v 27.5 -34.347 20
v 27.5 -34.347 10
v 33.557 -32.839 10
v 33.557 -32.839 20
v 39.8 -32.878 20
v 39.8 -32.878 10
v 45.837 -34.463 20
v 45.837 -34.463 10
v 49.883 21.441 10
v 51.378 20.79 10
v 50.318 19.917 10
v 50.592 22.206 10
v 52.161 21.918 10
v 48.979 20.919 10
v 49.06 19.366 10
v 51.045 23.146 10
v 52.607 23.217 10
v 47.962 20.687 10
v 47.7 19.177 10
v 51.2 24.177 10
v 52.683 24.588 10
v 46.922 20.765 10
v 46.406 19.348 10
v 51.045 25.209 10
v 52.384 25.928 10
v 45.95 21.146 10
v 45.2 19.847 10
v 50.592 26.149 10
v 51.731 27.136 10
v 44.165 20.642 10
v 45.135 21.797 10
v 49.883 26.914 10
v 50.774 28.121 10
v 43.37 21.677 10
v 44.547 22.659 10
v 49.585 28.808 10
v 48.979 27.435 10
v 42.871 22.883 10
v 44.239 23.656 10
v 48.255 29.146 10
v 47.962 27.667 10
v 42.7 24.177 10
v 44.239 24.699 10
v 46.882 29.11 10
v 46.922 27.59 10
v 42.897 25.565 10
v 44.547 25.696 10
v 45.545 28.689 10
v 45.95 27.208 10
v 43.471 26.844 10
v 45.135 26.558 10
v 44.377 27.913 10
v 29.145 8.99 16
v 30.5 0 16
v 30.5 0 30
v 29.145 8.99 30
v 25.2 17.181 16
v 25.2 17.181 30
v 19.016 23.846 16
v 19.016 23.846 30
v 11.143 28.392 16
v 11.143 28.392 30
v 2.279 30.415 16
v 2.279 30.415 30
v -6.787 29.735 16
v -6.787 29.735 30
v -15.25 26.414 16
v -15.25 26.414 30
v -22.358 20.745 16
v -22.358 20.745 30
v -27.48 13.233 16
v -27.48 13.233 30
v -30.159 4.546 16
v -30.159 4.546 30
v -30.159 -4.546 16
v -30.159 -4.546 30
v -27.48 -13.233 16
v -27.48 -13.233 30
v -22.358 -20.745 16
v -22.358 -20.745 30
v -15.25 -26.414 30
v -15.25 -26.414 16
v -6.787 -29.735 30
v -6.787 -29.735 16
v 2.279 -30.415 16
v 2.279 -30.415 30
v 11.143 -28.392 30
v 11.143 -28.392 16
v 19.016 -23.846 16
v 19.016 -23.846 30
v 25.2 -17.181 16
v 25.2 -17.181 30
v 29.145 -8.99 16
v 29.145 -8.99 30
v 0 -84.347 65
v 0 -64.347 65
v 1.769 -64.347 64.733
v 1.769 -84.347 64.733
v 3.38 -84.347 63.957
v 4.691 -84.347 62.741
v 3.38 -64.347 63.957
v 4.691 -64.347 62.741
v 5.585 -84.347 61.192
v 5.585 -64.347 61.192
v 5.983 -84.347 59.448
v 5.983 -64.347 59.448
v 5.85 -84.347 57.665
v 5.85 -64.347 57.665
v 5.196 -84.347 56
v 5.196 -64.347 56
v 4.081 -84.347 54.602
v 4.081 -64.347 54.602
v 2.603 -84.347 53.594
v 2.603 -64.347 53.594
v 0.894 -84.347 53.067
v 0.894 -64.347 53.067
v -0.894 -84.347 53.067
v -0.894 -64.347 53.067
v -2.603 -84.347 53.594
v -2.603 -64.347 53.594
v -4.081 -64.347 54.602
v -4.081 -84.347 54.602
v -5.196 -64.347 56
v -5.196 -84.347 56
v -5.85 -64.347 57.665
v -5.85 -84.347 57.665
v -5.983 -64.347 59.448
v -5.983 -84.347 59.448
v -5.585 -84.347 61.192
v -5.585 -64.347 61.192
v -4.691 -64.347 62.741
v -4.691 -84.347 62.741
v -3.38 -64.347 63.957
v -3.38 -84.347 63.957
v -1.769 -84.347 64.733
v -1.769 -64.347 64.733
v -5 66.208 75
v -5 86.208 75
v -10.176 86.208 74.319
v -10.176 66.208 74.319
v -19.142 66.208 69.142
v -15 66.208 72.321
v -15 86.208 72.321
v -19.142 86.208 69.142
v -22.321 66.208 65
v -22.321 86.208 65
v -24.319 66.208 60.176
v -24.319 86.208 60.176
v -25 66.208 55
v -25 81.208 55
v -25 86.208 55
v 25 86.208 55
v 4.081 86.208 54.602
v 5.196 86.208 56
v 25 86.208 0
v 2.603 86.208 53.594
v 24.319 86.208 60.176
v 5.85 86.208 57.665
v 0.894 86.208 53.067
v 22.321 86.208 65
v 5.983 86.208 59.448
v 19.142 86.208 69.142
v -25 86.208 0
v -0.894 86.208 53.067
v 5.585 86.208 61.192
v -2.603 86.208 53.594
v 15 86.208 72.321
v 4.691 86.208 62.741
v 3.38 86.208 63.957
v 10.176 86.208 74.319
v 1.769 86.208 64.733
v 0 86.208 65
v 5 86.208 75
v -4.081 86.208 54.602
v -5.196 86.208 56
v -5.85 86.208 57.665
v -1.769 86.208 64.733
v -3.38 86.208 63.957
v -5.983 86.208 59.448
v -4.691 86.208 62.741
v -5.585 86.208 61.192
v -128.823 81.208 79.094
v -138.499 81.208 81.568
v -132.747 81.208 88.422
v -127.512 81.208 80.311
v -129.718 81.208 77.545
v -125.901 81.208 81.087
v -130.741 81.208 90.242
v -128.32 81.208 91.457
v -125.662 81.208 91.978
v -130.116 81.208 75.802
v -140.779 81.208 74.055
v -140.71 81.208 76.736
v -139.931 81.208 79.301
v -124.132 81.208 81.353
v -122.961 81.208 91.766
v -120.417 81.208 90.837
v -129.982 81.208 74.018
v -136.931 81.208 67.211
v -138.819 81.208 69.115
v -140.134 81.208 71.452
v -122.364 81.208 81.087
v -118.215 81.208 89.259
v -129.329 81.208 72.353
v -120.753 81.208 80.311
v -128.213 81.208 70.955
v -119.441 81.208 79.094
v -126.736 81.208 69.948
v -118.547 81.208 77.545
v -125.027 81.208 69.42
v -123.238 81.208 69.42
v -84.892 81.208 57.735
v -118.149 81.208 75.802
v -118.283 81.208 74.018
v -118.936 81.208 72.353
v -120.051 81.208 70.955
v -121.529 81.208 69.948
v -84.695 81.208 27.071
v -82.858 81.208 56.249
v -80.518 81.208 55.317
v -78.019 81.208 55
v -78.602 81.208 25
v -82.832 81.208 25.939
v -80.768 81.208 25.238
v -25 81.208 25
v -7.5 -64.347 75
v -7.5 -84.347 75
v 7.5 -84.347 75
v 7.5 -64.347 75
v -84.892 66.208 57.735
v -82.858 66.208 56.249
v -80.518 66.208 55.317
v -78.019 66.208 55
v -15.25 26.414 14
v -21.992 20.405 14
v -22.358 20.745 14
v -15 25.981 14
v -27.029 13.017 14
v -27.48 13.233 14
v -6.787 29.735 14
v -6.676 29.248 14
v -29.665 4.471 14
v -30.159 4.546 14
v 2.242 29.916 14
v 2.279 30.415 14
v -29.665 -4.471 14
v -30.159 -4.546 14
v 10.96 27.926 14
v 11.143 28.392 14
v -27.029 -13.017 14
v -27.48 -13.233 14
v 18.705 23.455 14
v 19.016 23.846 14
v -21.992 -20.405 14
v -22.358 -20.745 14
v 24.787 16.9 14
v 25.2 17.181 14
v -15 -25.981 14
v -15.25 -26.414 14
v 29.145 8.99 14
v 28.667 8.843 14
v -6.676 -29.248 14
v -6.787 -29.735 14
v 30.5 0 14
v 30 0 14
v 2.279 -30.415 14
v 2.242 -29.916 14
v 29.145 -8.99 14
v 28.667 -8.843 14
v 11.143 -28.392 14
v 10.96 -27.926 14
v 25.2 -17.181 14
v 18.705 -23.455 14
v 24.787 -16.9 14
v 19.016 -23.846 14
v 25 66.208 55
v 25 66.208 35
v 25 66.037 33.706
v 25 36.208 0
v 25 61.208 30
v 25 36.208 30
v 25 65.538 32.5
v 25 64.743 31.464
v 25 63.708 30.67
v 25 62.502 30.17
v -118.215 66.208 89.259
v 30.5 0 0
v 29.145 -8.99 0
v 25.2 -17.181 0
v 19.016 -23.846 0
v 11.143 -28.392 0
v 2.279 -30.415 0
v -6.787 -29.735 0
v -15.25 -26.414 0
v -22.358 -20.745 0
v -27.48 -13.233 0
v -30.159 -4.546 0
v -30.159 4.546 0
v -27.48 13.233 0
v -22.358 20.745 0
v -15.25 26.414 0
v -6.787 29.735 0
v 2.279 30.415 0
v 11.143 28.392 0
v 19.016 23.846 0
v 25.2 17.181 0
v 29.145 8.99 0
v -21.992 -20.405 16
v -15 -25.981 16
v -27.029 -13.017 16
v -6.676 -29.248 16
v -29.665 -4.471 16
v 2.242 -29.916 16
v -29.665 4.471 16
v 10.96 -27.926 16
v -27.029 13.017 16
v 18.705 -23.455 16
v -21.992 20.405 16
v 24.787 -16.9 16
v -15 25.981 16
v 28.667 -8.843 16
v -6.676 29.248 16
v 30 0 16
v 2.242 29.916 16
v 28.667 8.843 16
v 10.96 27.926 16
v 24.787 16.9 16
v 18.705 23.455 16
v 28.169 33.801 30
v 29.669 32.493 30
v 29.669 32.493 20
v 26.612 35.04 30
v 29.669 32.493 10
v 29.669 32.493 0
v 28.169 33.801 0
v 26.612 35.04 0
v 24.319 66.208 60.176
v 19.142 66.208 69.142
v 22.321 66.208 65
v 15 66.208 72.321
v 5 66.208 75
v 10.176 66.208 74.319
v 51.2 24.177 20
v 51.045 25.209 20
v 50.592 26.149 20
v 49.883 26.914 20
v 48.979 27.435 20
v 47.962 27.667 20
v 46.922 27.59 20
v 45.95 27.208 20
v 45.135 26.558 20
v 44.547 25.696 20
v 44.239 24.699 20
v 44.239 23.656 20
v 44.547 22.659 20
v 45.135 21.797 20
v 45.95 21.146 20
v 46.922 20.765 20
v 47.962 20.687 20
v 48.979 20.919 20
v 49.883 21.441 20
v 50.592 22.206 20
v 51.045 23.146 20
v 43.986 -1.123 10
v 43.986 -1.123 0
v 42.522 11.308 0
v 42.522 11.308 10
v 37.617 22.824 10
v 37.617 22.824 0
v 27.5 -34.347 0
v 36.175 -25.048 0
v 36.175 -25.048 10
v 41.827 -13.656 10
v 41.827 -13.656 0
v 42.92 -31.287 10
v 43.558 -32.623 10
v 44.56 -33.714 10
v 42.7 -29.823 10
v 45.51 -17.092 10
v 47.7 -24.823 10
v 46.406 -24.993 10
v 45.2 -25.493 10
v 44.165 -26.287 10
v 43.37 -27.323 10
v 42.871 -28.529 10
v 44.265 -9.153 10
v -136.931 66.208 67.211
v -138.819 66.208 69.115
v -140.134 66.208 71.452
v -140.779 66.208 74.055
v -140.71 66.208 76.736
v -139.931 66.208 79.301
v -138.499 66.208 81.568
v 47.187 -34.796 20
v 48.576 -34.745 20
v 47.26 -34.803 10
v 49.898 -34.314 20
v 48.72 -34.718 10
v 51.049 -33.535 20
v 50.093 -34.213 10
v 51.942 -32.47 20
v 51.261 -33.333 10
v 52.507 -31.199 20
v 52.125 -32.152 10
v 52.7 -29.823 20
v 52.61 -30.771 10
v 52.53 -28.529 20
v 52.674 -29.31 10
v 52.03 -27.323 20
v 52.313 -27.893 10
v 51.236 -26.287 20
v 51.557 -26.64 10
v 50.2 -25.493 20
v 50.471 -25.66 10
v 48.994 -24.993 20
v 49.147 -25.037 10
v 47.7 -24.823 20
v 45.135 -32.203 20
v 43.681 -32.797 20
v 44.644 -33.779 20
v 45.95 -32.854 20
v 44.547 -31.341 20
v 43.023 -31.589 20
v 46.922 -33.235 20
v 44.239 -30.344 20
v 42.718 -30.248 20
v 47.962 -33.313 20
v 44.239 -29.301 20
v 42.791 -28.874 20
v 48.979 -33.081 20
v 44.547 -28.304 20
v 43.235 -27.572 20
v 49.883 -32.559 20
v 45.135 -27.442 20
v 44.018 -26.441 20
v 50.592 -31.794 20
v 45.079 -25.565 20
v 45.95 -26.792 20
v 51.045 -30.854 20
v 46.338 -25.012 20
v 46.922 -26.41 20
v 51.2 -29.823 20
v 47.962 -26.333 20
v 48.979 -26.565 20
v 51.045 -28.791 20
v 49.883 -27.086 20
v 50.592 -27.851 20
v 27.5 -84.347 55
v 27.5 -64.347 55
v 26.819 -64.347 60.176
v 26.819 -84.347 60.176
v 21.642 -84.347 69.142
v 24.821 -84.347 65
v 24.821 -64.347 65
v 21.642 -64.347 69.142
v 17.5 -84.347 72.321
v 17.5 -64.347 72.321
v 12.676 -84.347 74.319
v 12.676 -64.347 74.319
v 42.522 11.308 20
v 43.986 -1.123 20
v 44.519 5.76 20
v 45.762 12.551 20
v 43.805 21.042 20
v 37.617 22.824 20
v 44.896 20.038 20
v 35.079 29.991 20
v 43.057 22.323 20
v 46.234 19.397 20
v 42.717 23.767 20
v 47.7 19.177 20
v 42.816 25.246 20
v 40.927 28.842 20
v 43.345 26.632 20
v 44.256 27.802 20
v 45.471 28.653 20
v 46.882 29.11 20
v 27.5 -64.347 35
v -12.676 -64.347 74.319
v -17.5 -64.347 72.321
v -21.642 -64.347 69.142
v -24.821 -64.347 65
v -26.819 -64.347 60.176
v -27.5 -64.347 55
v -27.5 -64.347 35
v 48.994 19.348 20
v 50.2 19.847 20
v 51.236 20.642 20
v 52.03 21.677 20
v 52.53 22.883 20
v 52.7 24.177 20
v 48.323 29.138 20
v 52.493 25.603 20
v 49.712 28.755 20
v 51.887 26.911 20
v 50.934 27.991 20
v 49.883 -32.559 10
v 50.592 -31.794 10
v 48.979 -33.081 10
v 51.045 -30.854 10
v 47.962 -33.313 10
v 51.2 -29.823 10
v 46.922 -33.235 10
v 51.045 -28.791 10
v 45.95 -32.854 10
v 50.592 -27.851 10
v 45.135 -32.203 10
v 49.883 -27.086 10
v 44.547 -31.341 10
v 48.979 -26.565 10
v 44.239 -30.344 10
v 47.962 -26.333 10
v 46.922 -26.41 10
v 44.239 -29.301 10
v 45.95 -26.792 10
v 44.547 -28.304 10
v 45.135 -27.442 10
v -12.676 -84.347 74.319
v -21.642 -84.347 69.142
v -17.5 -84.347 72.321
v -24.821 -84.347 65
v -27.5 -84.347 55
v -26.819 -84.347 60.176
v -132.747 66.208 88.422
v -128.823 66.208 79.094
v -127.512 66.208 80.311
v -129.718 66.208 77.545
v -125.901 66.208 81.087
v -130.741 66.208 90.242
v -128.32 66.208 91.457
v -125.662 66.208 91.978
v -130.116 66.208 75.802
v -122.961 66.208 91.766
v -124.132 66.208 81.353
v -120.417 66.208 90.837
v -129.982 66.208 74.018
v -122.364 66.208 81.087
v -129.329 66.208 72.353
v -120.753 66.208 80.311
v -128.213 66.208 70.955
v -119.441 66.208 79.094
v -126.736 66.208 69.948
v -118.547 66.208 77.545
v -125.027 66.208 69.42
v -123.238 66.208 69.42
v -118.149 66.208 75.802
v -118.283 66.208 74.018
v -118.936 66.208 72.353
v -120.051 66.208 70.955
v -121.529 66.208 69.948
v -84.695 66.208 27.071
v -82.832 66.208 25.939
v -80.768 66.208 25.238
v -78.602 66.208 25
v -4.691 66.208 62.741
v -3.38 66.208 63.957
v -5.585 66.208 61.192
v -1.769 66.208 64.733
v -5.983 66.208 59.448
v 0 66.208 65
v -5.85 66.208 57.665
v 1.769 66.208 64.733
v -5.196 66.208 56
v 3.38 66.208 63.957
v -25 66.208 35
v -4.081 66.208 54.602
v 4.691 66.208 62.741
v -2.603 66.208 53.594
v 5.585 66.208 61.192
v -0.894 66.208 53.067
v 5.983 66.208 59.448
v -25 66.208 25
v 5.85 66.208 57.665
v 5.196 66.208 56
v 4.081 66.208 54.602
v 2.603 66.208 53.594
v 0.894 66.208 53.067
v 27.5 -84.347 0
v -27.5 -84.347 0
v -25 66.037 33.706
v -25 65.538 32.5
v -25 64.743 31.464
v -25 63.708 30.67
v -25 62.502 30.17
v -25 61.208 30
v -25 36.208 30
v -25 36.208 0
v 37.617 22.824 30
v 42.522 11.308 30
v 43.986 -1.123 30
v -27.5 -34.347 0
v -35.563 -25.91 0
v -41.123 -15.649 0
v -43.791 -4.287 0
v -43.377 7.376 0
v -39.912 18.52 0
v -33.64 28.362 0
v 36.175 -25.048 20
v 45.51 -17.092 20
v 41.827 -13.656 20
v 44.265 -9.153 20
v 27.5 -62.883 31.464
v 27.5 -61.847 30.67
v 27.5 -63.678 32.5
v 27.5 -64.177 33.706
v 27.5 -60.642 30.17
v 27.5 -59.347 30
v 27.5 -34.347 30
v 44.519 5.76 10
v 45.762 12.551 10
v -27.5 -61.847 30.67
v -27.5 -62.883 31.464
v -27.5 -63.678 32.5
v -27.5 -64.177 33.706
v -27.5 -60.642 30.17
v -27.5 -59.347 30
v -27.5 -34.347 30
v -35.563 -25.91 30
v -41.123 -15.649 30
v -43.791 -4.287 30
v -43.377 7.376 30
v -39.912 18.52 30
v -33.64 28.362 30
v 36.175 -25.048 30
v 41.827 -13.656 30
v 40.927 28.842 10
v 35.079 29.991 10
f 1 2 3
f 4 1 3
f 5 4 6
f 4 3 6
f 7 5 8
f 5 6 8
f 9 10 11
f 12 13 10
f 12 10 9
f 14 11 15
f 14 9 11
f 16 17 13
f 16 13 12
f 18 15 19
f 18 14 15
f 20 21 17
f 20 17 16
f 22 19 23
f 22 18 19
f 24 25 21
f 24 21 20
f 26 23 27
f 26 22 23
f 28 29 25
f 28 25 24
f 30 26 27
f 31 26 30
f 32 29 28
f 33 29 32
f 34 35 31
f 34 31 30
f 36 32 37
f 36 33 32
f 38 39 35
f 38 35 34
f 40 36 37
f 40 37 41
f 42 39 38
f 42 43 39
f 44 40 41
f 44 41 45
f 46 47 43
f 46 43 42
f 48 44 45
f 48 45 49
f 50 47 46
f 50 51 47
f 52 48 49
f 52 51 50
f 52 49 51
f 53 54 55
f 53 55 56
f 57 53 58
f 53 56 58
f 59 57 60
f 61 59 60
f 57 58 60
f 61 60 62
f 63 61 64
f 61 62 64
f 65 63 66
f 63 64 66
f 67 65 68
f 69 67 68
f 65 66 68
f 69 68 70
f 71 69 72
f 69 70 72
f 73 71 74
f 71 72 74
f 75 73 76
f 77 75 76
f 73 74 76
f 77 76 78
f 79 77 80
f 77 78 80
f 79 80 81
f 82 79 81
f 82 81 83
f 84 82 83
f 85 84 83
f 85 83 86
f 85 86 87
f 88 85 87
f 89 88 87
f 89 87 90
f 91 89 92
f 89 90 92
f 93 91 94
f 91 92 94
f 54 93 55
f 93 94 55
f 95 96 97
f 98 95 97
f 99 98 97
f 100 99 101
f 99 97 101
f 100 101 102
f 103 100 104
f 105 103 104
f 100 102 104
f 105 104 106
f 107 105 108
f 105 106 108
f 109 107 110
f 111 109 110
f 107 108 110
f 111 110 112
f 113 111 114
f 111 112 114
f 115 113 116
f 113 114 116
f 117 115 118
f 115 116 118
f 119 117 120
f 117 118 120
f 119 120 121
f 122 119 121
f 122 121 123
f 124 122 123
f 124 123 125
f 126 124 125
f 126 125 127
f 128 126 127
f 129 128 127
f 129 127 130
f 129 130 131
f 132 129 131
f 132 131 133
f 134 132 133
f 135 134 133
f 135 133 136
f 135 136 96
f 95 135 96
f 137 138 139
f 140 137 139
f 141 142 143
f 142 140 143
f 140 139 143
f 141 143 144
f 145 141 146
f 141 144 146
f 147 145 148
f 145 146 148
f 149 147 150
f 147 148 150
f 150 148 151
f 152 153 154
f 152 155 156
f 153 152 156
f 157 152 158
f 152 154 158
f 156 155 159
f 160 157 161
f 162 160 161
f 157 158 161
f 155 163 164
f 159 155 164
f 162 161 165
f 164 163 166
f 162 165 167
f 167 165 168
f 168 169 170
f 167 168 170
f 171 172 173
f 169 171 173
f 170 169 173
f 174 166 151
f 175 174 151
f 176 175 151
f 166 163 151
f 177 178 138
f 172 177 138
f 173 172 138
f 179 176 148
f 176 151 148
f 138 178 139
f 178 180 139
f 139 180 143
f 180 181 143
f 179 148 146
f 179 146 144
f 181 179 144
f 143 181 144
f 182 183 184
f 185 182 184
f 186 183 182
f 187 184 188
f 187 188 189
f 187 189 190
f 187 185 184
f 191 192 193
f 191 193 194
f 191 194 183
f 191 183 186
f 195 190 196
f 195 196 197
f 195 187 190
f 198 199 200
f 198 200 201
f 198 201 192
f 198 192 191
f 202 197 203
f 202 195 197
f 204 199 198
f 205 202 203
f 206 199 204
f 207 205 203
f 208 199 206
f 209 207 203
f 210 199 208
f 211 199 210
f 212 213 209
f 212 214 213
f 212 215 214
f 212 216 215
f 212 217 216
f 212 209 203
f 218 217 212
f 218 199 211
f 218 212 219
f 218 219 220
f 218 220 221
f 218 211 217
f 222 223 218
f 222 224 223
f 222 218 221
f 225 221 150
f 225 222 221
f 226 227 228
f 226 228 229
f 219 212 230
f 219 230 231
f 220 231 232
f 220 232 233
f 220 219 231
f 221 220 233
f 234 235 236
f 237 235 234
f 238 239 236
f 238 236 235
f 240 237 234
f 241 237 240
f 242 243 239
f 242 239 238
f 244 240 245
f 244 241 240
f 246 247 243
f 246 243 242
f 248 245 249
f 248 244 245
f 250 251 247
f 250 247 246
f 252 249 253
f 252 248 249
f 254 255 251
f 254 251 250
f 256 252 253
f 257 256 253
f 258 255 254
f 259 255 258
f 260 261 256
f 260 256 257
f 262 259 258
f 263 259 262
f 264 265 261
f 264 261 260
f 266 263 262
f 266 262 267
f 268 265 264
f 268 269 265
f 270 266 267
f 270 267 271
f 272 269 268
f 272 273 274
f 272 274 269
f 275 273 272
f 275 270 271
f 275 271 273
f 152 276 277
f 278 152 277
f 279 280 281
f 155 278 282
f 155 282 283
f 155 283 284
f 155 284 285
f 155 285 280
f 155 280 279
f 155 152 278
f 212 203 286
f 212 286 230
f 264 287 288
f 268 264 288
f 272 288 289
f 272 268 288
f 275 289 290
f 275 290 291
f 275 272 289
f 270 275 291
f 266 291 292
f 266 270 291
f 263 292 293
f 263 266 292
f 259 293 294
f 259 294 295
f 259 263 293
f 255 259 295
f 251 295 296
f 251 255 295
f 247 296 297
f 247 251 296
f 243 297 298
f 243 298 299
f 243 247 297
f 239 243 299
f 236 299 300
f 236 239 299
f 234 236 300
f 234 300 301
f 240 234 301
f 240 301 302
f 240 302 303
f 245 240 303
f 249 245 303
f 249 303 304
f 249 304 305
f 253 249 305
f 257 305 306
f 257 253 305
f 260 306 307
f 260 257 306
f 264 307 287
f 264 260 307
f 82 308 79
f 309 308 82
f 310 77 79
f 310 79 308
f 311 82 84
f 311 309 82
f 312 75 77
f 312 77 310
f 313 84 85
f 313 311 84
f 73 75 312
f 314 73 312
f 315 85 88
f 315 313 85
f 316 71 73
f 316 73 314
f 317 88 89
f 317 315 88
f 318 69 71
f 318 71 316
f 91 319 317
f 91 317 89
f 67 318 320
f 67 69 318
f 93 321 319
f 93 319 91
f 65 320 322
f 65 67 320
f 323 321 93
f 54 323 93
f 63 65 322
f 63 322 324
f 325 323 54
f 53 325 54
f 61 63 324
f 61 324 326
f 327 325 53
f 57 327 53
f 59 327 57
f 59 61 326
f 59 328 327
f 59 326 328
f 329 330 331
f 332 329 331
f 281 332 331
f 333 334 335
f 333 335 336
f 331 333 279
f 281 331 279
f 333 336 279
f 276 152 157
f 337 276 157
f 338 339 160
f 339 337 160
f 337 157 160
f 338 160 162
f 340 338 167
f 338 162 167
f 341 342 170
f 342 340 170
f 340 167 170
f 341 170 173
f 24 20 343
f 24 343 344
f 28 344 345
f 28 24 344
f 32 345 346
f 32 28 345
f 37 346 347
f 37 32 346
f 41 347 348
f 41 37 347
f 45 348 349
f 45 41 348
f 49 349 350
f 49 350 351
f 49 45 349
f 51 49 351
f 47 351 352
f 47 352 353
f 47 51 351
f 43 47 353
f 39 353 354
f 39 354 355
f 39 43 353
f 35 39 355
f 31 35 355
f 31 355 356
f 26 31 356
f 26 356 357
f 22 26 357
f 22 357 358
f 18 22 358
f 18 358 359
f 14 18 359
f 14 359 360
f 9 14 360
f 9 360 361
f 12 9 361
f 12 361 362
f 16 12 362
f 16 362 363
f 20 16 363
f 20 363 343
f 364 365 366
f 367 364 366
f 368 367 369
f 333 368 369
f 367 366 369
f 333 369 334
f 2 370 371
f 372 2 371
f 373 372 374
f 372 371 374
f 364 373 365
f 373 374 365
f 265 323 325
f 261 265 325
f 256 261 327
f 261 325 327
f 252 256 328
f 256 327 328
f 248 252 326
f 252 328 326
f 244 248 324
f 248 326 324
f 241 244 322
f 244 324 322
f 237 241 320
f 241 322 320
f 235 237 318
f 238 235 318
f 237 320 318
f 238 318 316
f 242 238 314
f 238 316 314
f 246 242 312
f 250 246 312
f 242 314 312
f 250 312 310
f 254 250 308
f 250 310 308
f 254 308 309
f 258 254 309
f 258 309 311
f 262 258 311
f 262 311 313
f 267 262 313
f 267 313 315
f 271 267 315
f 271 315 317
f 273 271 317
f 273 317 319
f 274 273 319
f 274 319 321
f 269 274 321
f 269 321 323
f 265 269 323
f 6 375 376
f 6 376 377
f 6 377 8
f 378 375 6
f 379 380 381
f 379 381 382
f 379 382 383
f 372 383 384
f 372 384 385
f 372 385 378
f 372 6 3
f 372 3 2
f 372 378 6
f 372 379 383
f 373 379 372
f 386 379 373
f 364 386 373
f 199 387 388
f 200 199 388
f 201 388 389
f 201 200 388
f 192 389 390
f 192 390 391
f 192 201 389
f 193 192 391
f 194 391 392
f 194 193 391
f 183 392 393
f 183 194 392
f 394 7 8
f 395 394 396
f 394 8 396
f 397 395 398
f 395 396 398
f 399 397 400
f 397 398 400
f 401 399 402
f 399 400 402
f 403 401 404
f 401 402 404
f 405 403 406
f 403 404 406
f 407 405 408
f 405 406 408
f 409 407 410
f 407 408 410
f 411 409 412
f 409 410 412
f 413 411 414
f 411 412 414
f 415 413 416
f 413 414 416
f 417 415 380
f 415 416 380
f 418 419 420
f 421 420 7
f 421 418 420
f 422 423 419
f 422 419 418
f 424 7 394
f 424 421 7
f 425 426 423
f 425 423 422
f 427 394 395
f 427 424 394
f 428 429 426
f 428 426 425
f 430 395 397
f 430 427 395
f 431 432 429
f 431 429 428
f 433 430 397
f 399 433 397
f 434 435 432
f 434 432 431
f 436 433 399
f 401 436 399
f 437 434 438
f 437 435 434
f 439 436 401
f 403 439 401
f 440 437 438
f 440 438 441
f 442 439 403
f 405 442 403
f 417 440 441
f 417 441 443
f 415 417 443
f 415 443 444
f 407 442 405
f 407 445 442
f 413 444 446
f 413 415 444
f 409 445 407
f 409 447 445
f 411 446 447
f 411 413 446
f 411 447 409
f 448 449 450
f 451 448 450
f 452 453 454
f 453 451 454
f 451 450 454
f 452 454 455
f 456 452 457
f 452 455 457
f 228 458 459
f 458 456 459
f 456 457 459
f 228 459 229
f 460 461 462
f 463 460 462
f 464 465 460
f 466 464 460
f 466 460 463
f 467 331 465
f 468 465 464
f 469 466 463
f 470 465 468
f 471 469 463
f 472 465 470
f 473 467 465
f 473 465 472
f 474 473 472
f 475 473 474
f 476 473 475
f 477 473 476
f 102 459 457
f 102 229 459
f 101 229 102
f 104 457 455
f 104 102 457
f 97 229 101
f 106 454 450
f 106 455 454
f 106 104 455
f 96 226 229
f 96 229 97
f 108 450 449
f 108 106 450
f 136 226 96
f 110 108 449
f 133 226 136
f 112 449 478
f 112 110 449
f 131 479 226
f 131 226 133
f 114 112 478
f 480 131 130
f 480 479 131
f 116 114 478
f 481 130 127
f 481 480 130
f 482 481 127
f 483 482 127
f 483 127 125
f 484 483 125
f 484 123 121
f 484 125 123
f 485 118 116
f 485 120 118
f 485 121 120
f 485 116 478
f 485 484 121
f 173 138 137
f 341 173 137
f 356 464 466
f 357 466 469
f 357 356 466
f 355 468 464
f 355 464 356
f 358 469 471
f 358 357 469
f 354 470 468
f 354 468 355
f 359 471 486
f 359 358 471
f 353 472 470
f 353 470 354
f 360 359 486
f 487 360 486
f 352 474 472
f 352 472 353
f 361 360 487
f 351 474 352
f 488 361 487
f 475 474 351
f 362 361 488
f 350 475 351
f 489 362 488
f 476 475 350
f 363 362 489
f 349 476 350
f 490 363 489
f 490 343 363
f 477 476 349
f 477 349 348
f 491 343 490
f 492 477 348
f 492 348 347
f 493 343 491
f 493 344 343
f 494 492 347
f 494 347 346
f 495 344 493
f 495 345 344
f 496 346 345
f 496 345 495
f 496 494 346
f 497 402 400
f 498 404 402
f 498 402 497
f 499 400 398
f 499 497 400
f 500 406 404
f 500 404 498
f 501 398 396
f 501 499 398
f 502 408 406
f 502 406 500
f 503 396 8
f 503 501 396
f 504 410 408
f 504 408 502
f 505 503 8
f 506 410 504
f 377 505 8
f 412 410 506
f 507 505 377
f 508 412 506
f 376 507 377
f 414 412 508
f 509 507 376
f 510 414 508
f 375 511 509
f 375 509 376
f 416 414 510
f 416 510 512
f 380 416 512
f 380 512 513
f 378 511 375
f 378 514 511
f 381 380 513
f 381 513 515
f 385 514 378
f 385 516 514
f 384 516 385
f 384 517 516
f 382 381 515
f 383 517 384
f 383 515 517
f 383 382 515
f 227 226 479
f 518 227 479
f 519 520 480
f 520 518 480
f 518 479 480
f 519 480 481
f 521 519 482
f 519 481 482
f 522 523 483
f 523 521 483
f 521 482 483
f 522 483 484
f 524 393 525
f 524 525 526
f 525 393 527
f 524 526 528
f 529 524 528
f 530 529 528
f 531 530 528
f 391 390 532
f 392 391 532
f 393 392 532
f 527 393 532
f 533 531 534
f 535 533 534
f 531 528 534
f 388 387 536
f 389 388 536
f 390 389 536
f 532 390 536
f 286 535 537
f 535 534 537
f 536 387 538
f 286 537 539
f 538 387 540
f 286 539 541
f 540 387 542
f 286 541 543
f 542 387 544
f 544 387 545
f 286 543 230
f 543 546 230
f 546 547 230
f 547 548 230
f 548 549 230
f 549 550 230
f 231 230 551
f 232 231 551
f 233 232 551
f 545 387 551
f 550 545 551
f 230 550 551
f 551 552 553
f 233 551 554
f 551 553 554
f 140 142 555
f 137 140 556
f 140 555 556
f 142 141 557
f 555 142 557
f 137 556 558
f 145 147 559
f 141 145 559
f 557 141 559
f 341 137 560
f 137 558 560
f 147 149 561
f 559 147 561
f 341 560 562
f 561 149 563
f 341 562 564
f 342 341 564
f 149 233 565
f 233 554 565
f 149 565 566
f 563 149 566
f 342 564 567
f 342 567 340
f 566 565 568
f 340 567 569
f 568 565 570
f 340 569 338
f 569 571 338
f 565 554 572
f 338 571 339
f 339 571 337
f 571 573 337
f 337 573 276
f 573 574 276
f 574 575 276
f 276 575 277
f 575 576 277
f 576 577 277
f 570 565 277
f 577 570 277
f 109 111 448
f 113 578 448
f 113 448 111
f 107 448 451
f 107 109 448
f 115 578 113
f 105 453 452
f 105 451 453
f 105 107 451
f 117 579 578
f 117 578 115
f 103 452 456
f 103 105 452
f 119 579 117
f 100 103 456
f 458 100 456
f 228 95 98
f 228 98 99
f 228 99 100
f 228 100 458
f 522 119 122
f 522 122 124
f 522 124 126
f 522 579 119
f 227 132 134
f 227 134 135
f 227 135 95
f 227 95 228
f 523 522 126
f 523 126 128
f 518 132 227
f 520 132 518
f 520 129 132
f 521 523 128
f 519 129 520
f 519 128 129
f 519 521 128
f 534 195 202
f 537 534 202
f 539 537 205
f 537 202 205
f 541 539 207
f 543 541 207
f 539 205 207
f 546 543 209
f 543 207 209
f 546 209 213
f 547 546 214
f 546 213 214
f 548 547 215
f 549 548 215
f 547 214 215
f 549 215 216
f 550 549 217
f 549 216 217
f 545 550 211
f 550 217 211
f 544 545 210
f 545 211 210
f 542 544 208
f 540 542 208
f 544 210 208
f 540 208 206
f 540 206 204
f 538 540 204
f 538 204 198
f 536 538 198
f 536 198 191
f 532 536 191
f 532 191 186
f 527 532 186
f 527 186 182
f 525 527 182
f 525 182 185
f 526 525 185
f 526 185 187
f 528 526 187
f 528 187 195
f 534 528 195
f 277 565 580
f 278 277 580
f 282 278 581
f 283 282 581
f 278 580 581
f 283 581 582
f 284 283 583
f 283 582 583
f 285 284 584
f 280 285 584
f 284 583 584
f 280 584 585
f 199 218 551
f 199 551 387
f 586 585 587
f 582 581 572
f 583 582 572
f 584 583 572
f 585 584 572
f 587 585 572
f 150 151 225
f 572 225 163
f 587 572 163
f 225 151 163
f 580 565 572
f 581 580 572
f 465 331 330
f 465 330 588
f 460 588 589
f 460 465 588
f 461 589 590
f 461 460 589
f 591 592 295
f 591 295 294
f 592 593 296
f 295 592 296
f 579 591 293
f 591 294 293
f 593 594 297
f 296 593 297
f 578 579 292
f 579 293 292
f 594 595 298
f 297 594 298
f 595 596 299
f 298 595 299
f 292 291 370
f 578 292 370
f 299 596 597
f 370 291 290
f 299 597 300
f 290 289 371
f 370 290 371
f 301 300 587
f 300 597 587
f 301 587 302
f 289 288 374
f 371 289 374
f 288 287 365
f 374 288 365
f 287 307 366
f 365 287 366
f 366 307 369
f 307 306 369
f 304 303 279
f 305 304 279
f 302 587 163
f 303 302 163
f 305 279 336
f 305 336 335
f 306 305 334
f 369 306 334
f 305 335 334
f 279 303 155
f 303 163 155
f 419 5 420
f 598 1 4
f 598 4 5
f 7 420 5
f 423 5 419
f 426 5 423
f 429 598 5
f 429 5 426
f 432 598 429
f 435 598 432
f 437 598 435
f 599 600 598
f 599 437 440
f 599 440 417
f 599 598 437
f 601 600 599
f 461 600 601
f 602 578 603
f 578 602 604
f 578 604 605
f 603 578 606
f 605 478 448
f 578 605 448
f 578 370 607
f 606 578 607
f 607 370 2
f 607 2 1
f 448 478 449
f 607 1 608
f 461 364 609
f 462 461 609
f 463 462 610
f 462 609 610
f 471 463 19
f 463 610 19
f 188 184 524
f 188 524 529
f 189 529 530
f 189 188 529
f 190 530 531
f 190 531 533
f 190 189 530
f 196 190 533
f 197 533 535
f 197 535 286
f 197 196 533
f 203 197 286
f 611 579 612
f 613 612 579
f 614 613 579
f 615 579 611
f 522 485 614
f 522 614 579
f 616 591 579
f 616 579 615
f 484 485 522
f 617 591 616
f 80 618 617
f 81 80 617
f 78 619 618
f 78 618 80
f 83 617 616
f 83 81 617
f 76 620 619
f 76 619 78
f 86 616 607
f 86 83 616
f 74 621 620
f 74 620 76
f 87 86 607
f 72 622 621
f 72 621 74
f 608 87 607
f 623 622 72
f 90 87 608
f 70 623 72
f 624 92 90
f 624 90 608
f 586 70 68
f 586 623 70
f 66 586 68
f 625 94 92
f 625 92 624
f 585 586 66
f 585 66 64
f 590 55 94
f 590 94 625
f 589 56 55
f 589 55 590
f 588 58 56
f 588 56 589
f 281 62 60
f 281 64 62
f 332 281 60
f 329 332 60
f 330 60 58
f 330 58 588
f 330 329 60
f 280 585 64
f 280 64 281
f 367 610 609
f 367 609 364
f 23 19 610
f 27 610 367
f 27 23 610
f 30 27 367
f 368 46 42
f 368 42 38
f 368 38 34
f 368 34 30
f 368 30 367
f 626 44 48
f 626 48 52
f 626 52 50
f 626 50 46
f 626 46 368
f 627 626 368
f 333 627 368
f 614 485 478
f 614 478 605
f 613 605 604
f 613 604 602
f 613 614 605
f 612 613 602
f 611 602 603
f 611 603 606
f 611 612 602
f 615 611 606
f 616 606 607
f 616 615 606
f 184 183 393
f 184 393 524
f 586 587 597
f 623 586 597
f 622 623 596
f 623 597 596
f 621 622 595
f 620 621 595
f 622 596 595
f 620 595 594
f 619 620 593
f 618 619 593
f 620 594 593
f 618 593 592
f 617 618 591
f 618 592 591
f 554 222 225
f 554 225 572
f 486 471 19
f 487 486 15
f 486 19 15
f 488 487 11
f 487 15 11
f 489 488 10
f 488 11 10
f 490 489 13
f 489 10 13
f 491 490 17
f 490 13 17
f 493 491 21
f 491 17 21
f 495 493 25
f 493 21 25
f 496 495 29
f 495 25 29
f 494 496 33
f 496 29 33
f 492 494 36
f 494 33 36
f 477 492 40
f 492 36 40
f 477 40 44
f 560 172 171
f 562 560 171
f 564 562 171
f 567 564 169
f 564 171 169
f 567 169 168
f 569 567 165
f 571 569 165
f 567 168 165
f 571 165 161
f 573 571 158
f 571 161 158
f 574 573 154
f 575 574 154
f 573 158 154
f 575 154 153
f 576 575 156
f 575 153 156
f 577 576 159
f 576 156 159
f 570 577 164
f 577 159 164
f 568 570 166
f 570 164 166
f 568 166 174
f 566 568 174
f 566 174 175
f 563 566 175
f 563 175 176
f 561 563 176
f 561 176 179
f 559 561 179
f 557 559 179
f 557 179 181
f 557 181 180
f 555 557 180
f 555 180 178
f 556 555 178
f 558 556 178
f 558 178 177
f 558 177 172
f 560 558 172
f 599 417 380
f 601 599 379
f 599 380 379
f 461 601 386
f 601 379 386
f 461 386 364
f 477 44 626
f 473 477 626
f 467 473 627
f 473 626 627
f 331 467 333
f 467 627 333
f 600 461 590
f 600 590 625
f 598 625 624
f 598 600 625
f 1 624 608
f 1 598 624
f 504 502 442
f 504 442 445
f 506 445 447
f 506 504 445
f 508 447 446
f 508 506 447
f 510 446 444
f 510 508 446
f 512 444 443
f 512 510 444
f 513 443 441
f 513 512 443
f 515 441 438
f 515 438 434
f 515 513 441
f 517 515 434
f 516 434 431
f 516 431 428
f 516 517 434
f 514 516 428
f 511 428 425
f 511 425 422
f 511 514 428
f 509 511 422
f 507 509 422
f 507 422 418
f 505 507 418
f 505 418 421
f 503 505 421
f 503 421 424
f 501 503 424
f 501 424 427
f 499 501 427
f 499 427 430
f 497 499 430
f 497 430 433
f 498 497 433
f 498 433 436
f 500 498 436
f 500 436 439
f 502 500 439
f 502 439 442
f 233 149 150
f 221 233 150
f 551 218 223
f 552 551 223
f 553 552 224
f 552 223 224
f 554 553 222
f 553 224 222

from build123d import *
from build123d.topology import SkipClean

# Parameters (mm, degrees)
BOSS_EXTRUDE1_DEPTH = 30
BOSS_EXTRUDE2_DEPTH = 55
BOSS_EXTRUDE3_DEPTH = 50
SKETCH7_R           = 6
CUT_EXTRUDE4_DEPTH  = 174.861655244
SKETCH9_R           = 6
CUT_EXTRUDE6_DEPTH  = 50
BOSS_EXTRUDE4_DEPTH = 57
BOSS_EXTRUDE5_DEPTH = 15
CUT_EXTRUDE8_DEPTH  = 20
SKETCH14_R          = 6
CUT_EXTRUDE9_DEPTH  = 20
SKETCH29_R          = 30
CUT_EXTRUDE10_DEPTH = 177.381705753
SKETCH31_R          = 30.5
CUT_EXTRUDE11_DEPTH = 14
CUT_EXTRUDE12_START = -14
SKETCH32_R          = 30.5
CUT_EXTRUDE12_DEPTH = 14
BOSS_EXTRUDE6_START = -30
SKETCH33_R          = 5
SKETCH33_R_2        = 3.5
BOSS_EXTRUDE6_DEPTH = 30
CUT_EXTRUDE13_START = -10
SKETCH34_R          = 3.5
CUT_EXTRUDE13_DEPTH = 10
SKETCH35_R          = 3.5
CUT_EXTRUDE14_DEPTH = 10


with BuildPart() as part:
    # Sketch1 → Boss-Extrude1 (new body)
    with BuildSketch(Plane.XY):
        with BuildLine():
            Line((-25, 86.20773398), (-25, 36.20773398))
            ThreePointArc((-25, 36.20773398), (-43.972404666, 1.558084675), (-27.5, -34.347488991))
            Line((-27.5, -34.347488991), (-27.5, -84.347488991))
            Line((-27.5, -84.347488991), (27.5, -84.347488991))
            Line((27.5, -84.347488991), (27.5, -34.347488991))
            ThreePointArc((27.5, -34.347488991), (43.972404666, 1.558084675), (25, 36.20773398))
            Line((25, 36.20773398), (25, 86.20773398))
            Line((25, 86.20773398), (-25, 86.20773398))
        make_face()
    extrude(amount=BOSS_EXTRUDE1_DEPTH)

    # Sketch3 → Boss-Extrude2 (add)
    with BuildSketch(Plane.ZY.offset(27.5)):
        with BuildLine():
            Line((30, -59.347488991), (30, -84.347488991))
            Line((30, -84.347488991), (55, -84.347488991))
            Line((55, -84.347488991), (75, -84.347488991))
            Line((75, -84.347488991), (75, -79.347488991))
            Line((75, -79.347488991), (75, -69.347488991))
            Line((75, -69.347488991), (75, -64.347488991))
            Line((75, -64.347488991), (55, -64.347488991))
            Line((55, -64.347488991), (35, -64.347488991))
            ThreePointArc((35, -64.347488991), (31.464466094, -62.883022897), (30, -59.347488991))
        make_face()
    extrude(amount=-BOSS_EXTRUDE2_DEPTH)

    # Sketch5 → Boss-Extrude3 (add)
    with BuildSketch(Plane.ZY.offset(25)):
        with BuildLine():
            Line((30, 86.20773398), (55, 86.20773398))
            Line((55, 86.20773398), (75, 86.20773398))
            Line((75, 86.20773398), (75, 81.20773398))
            Line((75, 81.20773398), (75, 71.20773398))
            Line((75, 71.20773398), (75, 66.20773398))
            Line((75, 66.20773398), (70, 66.20773398))
            Line((70, 66.20773398), (35, 66.20773398))
            ThreePointArc((35, 66.20773398), (31.464466094, 64.743267886), (30, 61.20773398))
            Line((30, 61.20773398), (30, 36.20773398))
            Line((30, 36.20773398), (0, 36.20773398))
            Line((0, 36.20773398), (0, 86.20773398))
            Line((0, 86.20773398), (30, 86.20773398))
        make_face()
    extrude(amount=-BOSS_EXTRUDE3_DEPTH)

    # Sketch7 → Cut-Extrude4 (cut, through all)
    with BuildSketch(Plane(origin=(0, -64.347488991, 0), x_dir=(1, 0, 0), z_dir=(0, 1, 0))):
        with BuildLine():
            Line((-27.5, -75), (-7.5, -75))
            ThreePointArc((-7.5, -75), (-21.642135624, -69.142135624), (-27.5, -55))
            Line((-27.5, -55), (-27.5, -75))
        make_face()
        with BuildLine():
            ThreePointArc((27.5, -55), (21.642135624, -69.142135624), (7.5, -75))
            Line((7.5, -75), (27.5, -75))
            Line((27.5, -75), (27.5, -55))
        make_face()
        with Locations(Location((0, -59, 0), (0, 0, 270))):
            Circle(SKETCH7_R)
    extrude(amount=-CUT_EXTRUDE4_DEPTH, mode=Mode.SUBTRACT)

    # Sketch9 → Cut-Extrude6 (cut)
    with BuildSketch(Plane(origin=(0, 86.20773398, 0), x_dir=(1, 0, 0), z_dir=(0, 1, 0))):
        with Locations(Location((0, -59, 0), (0, 0, 270))):
            Circle(SKETCH9_R)
        with BuildLine():
            ThreePointArc((-5, -75), (-19.142135624, -69.142135624), (-25, -55))
            Line((-25, -55), (-25, -75))
            Line((-25, -75), (-5, -75))
        make_face()
        with BuildLine():
            Line((25, -75), (25, -55))
            ThreePointArc((25, -55), (19.142135624, -69.142135624), (5, -75))
            Line((5, -75), (25, -75))
        make_face()
    extrude(amount=-CUT_EXTRUDE6_DEPTH, mode=Mode.SUBTRACT)

    # 3DSketch1 → Boss-Extrude4 (add)
    with BuildSketch(Plane(origin=(-25, 66.20773398, 55), x_dir=(0, 0.44721359549995654, -0.8944271909999166), z_dir=(-1, 0, 0))):
        Polygon((0, 0), (6.708203932, -13.416407865), (33.541019662, 0), (26.83281573, 13.416407865), align=None)
    extrude(amount=BOSS_EXTRUDE4_DEPTH)

    # Sketch11 → Boss-Extrude5 (add)
    with BuildSketch(Plane(origin=(0, 81.20773398, 0), x_dir=(1, 0, 0), z_dir=(0, 1, 0))):
        with BuildLine():
            Line((-82, -25), (-136.931437168, -67.210861168))
            ThreePointArc((-136.931437168, -67.210861168), (-140.779268652, -74.054950012), (-138.498773239, -81.568051896))
            Line((-138.498773239, -81.568051896), (-132.747448798, -88.42221346))
            ThreePointArc((-132.747448798, -88.42221346), (-125.661757565, -91.977806638), (-118.214838183, -89.258862946))
            Line((-118.214838183, -89.258862946), (-84.891653571, -57.735474417))
            ThreePointArc((-84.891653571, -57.735474417), (-81.717780519, -55.709002857), (-78.019487387, -55))
            Line((-78.019487387, -55), (-82, -55))
            Line((-82, -55), (-82, -25))
        make_face()
    extrude(amount=-BOSS_EXTRUDE5_DEPTH)

    # Sketch13 → Cut-Extrude8 (cut)
    with BuildSketch(Plane(origin=(0, 81.20773398, 0), x_dir=(1, 0, 0), z_dir=(0, 1, 0))):
        with BuildLine():
            Line((-82, -25), (-84.69470274, -27.070685369))
            ThreePointArc((-84.69470274, -27.070685369), (-81.819268516, -25.531812573), (-78.60159438, -25))
            Line((-78.60159438, -25), (-82, -25))
        make_face()
    extrude(amount=-CUT_EXTRUDE8_DEPTH, mode=Mode.SUBTRACT)

    # Sketch14 → Cut-Extrude9 (cut)
    with BuildSketch(Plane(origin=(0, 81.20773398, 0), x_dir=(1, 0, 0), z_dir=(0, 1, 0))):
        with Locations(Location((-124.132444372, -75.353318533, 0), (0, 0, 270))):
            Circle(SKETCH14_R)
    extrude(amount=-CUT_EXTRUDE9_DEPTH, mode=Mode.SUBTRACT)

    # Sketch29 → Cut-Extrude10 (cut, through all)
    with BuildSketch(Plane.XY.offset(30)):
        Circle(SKETCH29_R)
    extrude(amount=-CUT_EXTRUDE10_DEPTH, mode=Mode.SUBTRACT)

    # Sketch31 → Cut-Extrude11 (cut)
    with BuildSketch(Plane.XY.offset(30)):
        Circle(SKETCH31_R)
    extrude(amount=-CUT_EXTRUDE11_DEPTH, mode=Mode.SUBTRACT)

    # Sketch32 → Cut-Extrude12 (cut)
    with BuildSketch(Plane(origin=(0, 0, 0), x_dir=(-1, 0, 0), z_dir=(0, 0, -1)).offset(CUT_EXTRUDE12_START)):
        with Locations(Location((0, 0, 0), (0, 0, 180))):
            Circle(SKETCH32_R)
    extrude(amount=CUT_EXTRUDE12_DEPTH, mode=Mode.SUBTRACT)

    # Sketch33 → Boss-Extrude6 (add)
    # profile 1 of 4: a face of its own
    with BuildSketch(Plane.XY.offset(30).offset(BOSS_EXTRUDE6_START)):
        with BuildLine():
            ThreePointArc((29.668581995, 32.492695216), (40.481284897, 17.241391274), (43.98567695, -1.122596647))
            ThreePointArc((43.98567695, -1.122596647), (45.052408179, 9.172001814), (47.700347933, 19.177254836))
            ThreePointArc((47.700347933, 19.177254836), (42.717236075, 23.76665015), (46.881912301, 29.109816353))
            ThreePointArc((46.881912301, 29.109816353), (37.968784011, 29.241858766), (29.668581995, 32.492695216))
        make_face()
    # profile 2 of 4: a face of its own
    with BuildSketch(Plane.XY.offset(30).offset(BOSS_EXTRUDE6_START)):
        with BuildLine():
            ThreePointArc((43.98567695, -1.122596647), (39.414767157, -19.556996956), (27.5, -34.347488991))
            ThreePointArc((27.5, -34.347488991), (36.679636907, -32.663078699), (45.837380536, -34.462718491))
            ThreePointArc((45.837380536, -34.462718491), (42.791179641, -28.874026722), (47.700347933, -24.822745164))
            ThreePointArc((47.700347933, -24.822745164), (44.767717102, -13.1412086), (43.98567695, -1.122596647))
        make_face()
    # profile 3 of 4: a face of its own
    with BuildSketch(Plane.XY.offset(30).offset(BOSS_EXTRUDE6_START)):
        with Locations((47.700347933, 24.177254836)):
            Circle(SKETCH33_R)
        with Locations((47.700347933, 24.177254836)):
            Circle(SKETCH33_R_2, mode=Mode.SUBTRACT)
    # profile 4 of 4: a face of its own
    with BuildSketch(Plane.XY.offset(30).offset(BOSS_EXTRUDE6_START)):
        with Locations((47.700347933, -29.822745164)):
            Circle(SKETCH33_R)
        with Locations((47.700347933, -29.822745164)):
            Circle(SKETCH33_R_2, mode=Mode.SUBTRACT)
    extrude(amount=BOSS_EXTRUDE6_DEPTH)

    # Sketch34 → Cut-Extrude13 (cut)
    # profile 1 of 4: a face of its own
    with SkipClean():  # the faces are left unmerged after this step: merging them gives an invalid solid
        with BuildSketch(Plane.XY.offset(30).offset(CUT_EXTRUDE13_START)):
            with BuildLine():
                ThreePointArc((47.700347933, 19.177254836), (42.717236075, 23.76665015), (46.881912301, 29.109816353))
                ThreePointArc((46.881912301, 29.109816353), (37.968784011, 29.241858766), (29.668581995, 32.492695216))
                ThreePointArc((29.668581995, 32.492695216), (40.481285017, 17.241390992), (43.985676935, -1.122597259))
                ThreePointArc((43.985676935, -1.122597259), (45.052408124, 9.172001513), (47.700347933, 19.177254836))
            make_face()
        # profile 2 of 4: a face of its own
        with BuildSketch(Plane.XY.offset(30).offset(CUT_EXTRUDE13_START)):
            with BuildLine():
                ThreePointArc((47.700347933, 19.177254836), (51.235881839, 20.64172093), (52.700347933, 24.177254836))
                ThreePointArc((52.700347933, 24.177254836), (50.933598762, 27.99118838), (46.881912301, 29.109816353))
                ThreePointArc((46.881912301, 29.109816353), (42.717236075, 23.76665015), (47.700347933, 19.177254836))
            make_face()
            with Locations((47.700347933, 24.177254836)):
                Circle(SKETCH34_R, mode=Mode.SUBTRACT)
        # profile 3 of 4: a face of its own
        with BuildSketch(Plane.XY.offset(30).offset(CUT_EXTRUDE13_START)):
            with BuildLine():
                ThreePointArc((47.700347933, -24.822745164), (44.767717149, -13.141208903), (43.985676935, -1.122597259))
                ThreePointArc((43.985676935, -1.122597259), (39.414767021, -19.55699723), (27.5, -34.347488991))
                ThreePointArc((27.5, -34.347488991), (36.679636907, -32.663078699), (45.837380536, -34.462718491))
                ThreePointArc((45.837380536, -34.462718491), (42.791179641, -28.874026722), (47.700347933, -24.822745164))
            make_face()
        # profile 4 of 4: a face of its own
        with BuildSketch(Plane.XY.offset(30).offset(CUT_EXTRUDE13_START)):
            with BuildLine():
                ThreePointArc((52.700347933, -29.822745164), (51.235881839, -26.287211258), (47.700347933, -24.822745164))
                ThreePointArc((47.700347933, -24.822745164), (42.791179641, -28.874026722), (45.837380536, -34.462718491))
                ThreePointArc((45.837380536, -34.462718491), (50.500808879, -33.964896597), (52.700347933, -29.822745164))
            make_face()
            with Locations((47.700347933, -29.822745164)):
                Circle(SKETCH34_R, mode=Mode.SUBTRACT)
        extrude(amount=CUT_EXTRUDE13_DEPTH, mode=Mode.SUBTRACT)

    # Sketch35 → Cut-Extrude14 (cut)
    # profile 1 of 4: a face of its own
    with SkipClean():  # the faces are left unmerged after this step: merging them gives an invalid solid
        with BuildSketch(Plane(origin=(0, 0, 0), x_dir=(-1, 0, 0), z_dir=(0, 0, -1))):
            with BuildLine():
                ThreePointArc((-43.985676947, -1.122596764), (-40.48128492, 17.24139122), (-29.668581995, 32.492695216))
                ThreePointArc((-29.668581995, 32.492695216), (-37.968784011, 29.241858766), (-46.881912301, 29.109816353))
                ThreePointArc((-46.881912301, 29.109816353), (-43.886414389, 27.410505665), (-42.700347933, 24.177254836))
                ThreePointArc((-42.700347933, 24.177254836), (-44.164814027, 20.64172093), (-47.700347933, 19.177254836))
                ThreePointArc((-47.700347933, 19.177254836), (-45.052408168, 9.172001756), (-43.985676947, -1.122596764))
            make_face()
        # profile 2 of 4: a face of its own
        with BuildSketch(Plane(origin=(0, 0, 0), x_dir=(-1, 0, 0), z_dir=(0, 0, -1))):
            with BuildLine():
                ThreePointArc((-42.700347933, 24.177254836), (-43.886414389, 27.410505665), (-46.881912301, 29.109816353))
                ThreePointArc((-46.881912301, 29.109816353), (-52.683459792, 24.587859522), (-47.700347933, 19.177254836))
                ThreePointArc((-47.700347933, 19.177254836), (-44.164814027, 20.64172093), (-42.700347933, 24.177254836))
            make_face()
            with Locations(Location((-47.700347933, 24.177254836, 0), (0, 0, 180))):
                Circle(SKETCH35_R, mode=Mode.SUBTRACT)
        # profile 3 of 4: a face of its own
        with BuildSketch(Plane(origin=(0, 0, 0), x_dir=(-1, 0, 0), z_dir=(0, 0, -1))):
            with BuildLine():
                ThreePointArc((-27.5, -34.347488991), (-39.414767131, -19.556997008), (-43.985676947, -1.122596764))
                ThreePointArc((-43.985676947, -1.122596764), (-44.767717111, -13.141208658), (-47.700347933, -24.822745164))
                ThreePointArc((-47.700347933, -24.822745164), (-44.164814027, -26.287211258), (-42.700347933, -29.822745164))
                ThreePointArc((-42.700347933, -29.822745164), (-43.558196501, -32.623206109), (-45.837380536, -34.462718491))
                ThreePointArc((-45.837380536, -34.462718491), (-36.679636907, -32.663078699), (-27.5, -34.347488991))
            make_face()
        # profile 4 of 4: a face of its own
        with BuildSketch(Plane(origin=(0, 0, 0), x_dir=(-1, 0, 0), z_dir=(0, 0, -1))):
            with BuildLine():
                ThreePointArc((-42.700347933, -29.822745164), (-44.164814027, -26.287211258), (-47.700347933, -24.822745164))
                ThreePointArc((-47.700347933, -24.822745164), (-52.609516225, -30.771463606), (-45.837380536, -34.462718491))
                ThreePointArc((-45.837380536, -34.462718491), (-43.558196501, -32.623206109), (-42.700347933, -29.822745164))
            make_face()
            with Locations(Location((-47.700347933, -29.822745164, 0), (0, 0, 180))):
                Circle(SKETCH35_R, mode=Mode.SUBTRACT)
        extrude(amount=-CUT_EXTRUDE14_DEPTH, mode=Mode.SUBTRACT)


solid = part.part
